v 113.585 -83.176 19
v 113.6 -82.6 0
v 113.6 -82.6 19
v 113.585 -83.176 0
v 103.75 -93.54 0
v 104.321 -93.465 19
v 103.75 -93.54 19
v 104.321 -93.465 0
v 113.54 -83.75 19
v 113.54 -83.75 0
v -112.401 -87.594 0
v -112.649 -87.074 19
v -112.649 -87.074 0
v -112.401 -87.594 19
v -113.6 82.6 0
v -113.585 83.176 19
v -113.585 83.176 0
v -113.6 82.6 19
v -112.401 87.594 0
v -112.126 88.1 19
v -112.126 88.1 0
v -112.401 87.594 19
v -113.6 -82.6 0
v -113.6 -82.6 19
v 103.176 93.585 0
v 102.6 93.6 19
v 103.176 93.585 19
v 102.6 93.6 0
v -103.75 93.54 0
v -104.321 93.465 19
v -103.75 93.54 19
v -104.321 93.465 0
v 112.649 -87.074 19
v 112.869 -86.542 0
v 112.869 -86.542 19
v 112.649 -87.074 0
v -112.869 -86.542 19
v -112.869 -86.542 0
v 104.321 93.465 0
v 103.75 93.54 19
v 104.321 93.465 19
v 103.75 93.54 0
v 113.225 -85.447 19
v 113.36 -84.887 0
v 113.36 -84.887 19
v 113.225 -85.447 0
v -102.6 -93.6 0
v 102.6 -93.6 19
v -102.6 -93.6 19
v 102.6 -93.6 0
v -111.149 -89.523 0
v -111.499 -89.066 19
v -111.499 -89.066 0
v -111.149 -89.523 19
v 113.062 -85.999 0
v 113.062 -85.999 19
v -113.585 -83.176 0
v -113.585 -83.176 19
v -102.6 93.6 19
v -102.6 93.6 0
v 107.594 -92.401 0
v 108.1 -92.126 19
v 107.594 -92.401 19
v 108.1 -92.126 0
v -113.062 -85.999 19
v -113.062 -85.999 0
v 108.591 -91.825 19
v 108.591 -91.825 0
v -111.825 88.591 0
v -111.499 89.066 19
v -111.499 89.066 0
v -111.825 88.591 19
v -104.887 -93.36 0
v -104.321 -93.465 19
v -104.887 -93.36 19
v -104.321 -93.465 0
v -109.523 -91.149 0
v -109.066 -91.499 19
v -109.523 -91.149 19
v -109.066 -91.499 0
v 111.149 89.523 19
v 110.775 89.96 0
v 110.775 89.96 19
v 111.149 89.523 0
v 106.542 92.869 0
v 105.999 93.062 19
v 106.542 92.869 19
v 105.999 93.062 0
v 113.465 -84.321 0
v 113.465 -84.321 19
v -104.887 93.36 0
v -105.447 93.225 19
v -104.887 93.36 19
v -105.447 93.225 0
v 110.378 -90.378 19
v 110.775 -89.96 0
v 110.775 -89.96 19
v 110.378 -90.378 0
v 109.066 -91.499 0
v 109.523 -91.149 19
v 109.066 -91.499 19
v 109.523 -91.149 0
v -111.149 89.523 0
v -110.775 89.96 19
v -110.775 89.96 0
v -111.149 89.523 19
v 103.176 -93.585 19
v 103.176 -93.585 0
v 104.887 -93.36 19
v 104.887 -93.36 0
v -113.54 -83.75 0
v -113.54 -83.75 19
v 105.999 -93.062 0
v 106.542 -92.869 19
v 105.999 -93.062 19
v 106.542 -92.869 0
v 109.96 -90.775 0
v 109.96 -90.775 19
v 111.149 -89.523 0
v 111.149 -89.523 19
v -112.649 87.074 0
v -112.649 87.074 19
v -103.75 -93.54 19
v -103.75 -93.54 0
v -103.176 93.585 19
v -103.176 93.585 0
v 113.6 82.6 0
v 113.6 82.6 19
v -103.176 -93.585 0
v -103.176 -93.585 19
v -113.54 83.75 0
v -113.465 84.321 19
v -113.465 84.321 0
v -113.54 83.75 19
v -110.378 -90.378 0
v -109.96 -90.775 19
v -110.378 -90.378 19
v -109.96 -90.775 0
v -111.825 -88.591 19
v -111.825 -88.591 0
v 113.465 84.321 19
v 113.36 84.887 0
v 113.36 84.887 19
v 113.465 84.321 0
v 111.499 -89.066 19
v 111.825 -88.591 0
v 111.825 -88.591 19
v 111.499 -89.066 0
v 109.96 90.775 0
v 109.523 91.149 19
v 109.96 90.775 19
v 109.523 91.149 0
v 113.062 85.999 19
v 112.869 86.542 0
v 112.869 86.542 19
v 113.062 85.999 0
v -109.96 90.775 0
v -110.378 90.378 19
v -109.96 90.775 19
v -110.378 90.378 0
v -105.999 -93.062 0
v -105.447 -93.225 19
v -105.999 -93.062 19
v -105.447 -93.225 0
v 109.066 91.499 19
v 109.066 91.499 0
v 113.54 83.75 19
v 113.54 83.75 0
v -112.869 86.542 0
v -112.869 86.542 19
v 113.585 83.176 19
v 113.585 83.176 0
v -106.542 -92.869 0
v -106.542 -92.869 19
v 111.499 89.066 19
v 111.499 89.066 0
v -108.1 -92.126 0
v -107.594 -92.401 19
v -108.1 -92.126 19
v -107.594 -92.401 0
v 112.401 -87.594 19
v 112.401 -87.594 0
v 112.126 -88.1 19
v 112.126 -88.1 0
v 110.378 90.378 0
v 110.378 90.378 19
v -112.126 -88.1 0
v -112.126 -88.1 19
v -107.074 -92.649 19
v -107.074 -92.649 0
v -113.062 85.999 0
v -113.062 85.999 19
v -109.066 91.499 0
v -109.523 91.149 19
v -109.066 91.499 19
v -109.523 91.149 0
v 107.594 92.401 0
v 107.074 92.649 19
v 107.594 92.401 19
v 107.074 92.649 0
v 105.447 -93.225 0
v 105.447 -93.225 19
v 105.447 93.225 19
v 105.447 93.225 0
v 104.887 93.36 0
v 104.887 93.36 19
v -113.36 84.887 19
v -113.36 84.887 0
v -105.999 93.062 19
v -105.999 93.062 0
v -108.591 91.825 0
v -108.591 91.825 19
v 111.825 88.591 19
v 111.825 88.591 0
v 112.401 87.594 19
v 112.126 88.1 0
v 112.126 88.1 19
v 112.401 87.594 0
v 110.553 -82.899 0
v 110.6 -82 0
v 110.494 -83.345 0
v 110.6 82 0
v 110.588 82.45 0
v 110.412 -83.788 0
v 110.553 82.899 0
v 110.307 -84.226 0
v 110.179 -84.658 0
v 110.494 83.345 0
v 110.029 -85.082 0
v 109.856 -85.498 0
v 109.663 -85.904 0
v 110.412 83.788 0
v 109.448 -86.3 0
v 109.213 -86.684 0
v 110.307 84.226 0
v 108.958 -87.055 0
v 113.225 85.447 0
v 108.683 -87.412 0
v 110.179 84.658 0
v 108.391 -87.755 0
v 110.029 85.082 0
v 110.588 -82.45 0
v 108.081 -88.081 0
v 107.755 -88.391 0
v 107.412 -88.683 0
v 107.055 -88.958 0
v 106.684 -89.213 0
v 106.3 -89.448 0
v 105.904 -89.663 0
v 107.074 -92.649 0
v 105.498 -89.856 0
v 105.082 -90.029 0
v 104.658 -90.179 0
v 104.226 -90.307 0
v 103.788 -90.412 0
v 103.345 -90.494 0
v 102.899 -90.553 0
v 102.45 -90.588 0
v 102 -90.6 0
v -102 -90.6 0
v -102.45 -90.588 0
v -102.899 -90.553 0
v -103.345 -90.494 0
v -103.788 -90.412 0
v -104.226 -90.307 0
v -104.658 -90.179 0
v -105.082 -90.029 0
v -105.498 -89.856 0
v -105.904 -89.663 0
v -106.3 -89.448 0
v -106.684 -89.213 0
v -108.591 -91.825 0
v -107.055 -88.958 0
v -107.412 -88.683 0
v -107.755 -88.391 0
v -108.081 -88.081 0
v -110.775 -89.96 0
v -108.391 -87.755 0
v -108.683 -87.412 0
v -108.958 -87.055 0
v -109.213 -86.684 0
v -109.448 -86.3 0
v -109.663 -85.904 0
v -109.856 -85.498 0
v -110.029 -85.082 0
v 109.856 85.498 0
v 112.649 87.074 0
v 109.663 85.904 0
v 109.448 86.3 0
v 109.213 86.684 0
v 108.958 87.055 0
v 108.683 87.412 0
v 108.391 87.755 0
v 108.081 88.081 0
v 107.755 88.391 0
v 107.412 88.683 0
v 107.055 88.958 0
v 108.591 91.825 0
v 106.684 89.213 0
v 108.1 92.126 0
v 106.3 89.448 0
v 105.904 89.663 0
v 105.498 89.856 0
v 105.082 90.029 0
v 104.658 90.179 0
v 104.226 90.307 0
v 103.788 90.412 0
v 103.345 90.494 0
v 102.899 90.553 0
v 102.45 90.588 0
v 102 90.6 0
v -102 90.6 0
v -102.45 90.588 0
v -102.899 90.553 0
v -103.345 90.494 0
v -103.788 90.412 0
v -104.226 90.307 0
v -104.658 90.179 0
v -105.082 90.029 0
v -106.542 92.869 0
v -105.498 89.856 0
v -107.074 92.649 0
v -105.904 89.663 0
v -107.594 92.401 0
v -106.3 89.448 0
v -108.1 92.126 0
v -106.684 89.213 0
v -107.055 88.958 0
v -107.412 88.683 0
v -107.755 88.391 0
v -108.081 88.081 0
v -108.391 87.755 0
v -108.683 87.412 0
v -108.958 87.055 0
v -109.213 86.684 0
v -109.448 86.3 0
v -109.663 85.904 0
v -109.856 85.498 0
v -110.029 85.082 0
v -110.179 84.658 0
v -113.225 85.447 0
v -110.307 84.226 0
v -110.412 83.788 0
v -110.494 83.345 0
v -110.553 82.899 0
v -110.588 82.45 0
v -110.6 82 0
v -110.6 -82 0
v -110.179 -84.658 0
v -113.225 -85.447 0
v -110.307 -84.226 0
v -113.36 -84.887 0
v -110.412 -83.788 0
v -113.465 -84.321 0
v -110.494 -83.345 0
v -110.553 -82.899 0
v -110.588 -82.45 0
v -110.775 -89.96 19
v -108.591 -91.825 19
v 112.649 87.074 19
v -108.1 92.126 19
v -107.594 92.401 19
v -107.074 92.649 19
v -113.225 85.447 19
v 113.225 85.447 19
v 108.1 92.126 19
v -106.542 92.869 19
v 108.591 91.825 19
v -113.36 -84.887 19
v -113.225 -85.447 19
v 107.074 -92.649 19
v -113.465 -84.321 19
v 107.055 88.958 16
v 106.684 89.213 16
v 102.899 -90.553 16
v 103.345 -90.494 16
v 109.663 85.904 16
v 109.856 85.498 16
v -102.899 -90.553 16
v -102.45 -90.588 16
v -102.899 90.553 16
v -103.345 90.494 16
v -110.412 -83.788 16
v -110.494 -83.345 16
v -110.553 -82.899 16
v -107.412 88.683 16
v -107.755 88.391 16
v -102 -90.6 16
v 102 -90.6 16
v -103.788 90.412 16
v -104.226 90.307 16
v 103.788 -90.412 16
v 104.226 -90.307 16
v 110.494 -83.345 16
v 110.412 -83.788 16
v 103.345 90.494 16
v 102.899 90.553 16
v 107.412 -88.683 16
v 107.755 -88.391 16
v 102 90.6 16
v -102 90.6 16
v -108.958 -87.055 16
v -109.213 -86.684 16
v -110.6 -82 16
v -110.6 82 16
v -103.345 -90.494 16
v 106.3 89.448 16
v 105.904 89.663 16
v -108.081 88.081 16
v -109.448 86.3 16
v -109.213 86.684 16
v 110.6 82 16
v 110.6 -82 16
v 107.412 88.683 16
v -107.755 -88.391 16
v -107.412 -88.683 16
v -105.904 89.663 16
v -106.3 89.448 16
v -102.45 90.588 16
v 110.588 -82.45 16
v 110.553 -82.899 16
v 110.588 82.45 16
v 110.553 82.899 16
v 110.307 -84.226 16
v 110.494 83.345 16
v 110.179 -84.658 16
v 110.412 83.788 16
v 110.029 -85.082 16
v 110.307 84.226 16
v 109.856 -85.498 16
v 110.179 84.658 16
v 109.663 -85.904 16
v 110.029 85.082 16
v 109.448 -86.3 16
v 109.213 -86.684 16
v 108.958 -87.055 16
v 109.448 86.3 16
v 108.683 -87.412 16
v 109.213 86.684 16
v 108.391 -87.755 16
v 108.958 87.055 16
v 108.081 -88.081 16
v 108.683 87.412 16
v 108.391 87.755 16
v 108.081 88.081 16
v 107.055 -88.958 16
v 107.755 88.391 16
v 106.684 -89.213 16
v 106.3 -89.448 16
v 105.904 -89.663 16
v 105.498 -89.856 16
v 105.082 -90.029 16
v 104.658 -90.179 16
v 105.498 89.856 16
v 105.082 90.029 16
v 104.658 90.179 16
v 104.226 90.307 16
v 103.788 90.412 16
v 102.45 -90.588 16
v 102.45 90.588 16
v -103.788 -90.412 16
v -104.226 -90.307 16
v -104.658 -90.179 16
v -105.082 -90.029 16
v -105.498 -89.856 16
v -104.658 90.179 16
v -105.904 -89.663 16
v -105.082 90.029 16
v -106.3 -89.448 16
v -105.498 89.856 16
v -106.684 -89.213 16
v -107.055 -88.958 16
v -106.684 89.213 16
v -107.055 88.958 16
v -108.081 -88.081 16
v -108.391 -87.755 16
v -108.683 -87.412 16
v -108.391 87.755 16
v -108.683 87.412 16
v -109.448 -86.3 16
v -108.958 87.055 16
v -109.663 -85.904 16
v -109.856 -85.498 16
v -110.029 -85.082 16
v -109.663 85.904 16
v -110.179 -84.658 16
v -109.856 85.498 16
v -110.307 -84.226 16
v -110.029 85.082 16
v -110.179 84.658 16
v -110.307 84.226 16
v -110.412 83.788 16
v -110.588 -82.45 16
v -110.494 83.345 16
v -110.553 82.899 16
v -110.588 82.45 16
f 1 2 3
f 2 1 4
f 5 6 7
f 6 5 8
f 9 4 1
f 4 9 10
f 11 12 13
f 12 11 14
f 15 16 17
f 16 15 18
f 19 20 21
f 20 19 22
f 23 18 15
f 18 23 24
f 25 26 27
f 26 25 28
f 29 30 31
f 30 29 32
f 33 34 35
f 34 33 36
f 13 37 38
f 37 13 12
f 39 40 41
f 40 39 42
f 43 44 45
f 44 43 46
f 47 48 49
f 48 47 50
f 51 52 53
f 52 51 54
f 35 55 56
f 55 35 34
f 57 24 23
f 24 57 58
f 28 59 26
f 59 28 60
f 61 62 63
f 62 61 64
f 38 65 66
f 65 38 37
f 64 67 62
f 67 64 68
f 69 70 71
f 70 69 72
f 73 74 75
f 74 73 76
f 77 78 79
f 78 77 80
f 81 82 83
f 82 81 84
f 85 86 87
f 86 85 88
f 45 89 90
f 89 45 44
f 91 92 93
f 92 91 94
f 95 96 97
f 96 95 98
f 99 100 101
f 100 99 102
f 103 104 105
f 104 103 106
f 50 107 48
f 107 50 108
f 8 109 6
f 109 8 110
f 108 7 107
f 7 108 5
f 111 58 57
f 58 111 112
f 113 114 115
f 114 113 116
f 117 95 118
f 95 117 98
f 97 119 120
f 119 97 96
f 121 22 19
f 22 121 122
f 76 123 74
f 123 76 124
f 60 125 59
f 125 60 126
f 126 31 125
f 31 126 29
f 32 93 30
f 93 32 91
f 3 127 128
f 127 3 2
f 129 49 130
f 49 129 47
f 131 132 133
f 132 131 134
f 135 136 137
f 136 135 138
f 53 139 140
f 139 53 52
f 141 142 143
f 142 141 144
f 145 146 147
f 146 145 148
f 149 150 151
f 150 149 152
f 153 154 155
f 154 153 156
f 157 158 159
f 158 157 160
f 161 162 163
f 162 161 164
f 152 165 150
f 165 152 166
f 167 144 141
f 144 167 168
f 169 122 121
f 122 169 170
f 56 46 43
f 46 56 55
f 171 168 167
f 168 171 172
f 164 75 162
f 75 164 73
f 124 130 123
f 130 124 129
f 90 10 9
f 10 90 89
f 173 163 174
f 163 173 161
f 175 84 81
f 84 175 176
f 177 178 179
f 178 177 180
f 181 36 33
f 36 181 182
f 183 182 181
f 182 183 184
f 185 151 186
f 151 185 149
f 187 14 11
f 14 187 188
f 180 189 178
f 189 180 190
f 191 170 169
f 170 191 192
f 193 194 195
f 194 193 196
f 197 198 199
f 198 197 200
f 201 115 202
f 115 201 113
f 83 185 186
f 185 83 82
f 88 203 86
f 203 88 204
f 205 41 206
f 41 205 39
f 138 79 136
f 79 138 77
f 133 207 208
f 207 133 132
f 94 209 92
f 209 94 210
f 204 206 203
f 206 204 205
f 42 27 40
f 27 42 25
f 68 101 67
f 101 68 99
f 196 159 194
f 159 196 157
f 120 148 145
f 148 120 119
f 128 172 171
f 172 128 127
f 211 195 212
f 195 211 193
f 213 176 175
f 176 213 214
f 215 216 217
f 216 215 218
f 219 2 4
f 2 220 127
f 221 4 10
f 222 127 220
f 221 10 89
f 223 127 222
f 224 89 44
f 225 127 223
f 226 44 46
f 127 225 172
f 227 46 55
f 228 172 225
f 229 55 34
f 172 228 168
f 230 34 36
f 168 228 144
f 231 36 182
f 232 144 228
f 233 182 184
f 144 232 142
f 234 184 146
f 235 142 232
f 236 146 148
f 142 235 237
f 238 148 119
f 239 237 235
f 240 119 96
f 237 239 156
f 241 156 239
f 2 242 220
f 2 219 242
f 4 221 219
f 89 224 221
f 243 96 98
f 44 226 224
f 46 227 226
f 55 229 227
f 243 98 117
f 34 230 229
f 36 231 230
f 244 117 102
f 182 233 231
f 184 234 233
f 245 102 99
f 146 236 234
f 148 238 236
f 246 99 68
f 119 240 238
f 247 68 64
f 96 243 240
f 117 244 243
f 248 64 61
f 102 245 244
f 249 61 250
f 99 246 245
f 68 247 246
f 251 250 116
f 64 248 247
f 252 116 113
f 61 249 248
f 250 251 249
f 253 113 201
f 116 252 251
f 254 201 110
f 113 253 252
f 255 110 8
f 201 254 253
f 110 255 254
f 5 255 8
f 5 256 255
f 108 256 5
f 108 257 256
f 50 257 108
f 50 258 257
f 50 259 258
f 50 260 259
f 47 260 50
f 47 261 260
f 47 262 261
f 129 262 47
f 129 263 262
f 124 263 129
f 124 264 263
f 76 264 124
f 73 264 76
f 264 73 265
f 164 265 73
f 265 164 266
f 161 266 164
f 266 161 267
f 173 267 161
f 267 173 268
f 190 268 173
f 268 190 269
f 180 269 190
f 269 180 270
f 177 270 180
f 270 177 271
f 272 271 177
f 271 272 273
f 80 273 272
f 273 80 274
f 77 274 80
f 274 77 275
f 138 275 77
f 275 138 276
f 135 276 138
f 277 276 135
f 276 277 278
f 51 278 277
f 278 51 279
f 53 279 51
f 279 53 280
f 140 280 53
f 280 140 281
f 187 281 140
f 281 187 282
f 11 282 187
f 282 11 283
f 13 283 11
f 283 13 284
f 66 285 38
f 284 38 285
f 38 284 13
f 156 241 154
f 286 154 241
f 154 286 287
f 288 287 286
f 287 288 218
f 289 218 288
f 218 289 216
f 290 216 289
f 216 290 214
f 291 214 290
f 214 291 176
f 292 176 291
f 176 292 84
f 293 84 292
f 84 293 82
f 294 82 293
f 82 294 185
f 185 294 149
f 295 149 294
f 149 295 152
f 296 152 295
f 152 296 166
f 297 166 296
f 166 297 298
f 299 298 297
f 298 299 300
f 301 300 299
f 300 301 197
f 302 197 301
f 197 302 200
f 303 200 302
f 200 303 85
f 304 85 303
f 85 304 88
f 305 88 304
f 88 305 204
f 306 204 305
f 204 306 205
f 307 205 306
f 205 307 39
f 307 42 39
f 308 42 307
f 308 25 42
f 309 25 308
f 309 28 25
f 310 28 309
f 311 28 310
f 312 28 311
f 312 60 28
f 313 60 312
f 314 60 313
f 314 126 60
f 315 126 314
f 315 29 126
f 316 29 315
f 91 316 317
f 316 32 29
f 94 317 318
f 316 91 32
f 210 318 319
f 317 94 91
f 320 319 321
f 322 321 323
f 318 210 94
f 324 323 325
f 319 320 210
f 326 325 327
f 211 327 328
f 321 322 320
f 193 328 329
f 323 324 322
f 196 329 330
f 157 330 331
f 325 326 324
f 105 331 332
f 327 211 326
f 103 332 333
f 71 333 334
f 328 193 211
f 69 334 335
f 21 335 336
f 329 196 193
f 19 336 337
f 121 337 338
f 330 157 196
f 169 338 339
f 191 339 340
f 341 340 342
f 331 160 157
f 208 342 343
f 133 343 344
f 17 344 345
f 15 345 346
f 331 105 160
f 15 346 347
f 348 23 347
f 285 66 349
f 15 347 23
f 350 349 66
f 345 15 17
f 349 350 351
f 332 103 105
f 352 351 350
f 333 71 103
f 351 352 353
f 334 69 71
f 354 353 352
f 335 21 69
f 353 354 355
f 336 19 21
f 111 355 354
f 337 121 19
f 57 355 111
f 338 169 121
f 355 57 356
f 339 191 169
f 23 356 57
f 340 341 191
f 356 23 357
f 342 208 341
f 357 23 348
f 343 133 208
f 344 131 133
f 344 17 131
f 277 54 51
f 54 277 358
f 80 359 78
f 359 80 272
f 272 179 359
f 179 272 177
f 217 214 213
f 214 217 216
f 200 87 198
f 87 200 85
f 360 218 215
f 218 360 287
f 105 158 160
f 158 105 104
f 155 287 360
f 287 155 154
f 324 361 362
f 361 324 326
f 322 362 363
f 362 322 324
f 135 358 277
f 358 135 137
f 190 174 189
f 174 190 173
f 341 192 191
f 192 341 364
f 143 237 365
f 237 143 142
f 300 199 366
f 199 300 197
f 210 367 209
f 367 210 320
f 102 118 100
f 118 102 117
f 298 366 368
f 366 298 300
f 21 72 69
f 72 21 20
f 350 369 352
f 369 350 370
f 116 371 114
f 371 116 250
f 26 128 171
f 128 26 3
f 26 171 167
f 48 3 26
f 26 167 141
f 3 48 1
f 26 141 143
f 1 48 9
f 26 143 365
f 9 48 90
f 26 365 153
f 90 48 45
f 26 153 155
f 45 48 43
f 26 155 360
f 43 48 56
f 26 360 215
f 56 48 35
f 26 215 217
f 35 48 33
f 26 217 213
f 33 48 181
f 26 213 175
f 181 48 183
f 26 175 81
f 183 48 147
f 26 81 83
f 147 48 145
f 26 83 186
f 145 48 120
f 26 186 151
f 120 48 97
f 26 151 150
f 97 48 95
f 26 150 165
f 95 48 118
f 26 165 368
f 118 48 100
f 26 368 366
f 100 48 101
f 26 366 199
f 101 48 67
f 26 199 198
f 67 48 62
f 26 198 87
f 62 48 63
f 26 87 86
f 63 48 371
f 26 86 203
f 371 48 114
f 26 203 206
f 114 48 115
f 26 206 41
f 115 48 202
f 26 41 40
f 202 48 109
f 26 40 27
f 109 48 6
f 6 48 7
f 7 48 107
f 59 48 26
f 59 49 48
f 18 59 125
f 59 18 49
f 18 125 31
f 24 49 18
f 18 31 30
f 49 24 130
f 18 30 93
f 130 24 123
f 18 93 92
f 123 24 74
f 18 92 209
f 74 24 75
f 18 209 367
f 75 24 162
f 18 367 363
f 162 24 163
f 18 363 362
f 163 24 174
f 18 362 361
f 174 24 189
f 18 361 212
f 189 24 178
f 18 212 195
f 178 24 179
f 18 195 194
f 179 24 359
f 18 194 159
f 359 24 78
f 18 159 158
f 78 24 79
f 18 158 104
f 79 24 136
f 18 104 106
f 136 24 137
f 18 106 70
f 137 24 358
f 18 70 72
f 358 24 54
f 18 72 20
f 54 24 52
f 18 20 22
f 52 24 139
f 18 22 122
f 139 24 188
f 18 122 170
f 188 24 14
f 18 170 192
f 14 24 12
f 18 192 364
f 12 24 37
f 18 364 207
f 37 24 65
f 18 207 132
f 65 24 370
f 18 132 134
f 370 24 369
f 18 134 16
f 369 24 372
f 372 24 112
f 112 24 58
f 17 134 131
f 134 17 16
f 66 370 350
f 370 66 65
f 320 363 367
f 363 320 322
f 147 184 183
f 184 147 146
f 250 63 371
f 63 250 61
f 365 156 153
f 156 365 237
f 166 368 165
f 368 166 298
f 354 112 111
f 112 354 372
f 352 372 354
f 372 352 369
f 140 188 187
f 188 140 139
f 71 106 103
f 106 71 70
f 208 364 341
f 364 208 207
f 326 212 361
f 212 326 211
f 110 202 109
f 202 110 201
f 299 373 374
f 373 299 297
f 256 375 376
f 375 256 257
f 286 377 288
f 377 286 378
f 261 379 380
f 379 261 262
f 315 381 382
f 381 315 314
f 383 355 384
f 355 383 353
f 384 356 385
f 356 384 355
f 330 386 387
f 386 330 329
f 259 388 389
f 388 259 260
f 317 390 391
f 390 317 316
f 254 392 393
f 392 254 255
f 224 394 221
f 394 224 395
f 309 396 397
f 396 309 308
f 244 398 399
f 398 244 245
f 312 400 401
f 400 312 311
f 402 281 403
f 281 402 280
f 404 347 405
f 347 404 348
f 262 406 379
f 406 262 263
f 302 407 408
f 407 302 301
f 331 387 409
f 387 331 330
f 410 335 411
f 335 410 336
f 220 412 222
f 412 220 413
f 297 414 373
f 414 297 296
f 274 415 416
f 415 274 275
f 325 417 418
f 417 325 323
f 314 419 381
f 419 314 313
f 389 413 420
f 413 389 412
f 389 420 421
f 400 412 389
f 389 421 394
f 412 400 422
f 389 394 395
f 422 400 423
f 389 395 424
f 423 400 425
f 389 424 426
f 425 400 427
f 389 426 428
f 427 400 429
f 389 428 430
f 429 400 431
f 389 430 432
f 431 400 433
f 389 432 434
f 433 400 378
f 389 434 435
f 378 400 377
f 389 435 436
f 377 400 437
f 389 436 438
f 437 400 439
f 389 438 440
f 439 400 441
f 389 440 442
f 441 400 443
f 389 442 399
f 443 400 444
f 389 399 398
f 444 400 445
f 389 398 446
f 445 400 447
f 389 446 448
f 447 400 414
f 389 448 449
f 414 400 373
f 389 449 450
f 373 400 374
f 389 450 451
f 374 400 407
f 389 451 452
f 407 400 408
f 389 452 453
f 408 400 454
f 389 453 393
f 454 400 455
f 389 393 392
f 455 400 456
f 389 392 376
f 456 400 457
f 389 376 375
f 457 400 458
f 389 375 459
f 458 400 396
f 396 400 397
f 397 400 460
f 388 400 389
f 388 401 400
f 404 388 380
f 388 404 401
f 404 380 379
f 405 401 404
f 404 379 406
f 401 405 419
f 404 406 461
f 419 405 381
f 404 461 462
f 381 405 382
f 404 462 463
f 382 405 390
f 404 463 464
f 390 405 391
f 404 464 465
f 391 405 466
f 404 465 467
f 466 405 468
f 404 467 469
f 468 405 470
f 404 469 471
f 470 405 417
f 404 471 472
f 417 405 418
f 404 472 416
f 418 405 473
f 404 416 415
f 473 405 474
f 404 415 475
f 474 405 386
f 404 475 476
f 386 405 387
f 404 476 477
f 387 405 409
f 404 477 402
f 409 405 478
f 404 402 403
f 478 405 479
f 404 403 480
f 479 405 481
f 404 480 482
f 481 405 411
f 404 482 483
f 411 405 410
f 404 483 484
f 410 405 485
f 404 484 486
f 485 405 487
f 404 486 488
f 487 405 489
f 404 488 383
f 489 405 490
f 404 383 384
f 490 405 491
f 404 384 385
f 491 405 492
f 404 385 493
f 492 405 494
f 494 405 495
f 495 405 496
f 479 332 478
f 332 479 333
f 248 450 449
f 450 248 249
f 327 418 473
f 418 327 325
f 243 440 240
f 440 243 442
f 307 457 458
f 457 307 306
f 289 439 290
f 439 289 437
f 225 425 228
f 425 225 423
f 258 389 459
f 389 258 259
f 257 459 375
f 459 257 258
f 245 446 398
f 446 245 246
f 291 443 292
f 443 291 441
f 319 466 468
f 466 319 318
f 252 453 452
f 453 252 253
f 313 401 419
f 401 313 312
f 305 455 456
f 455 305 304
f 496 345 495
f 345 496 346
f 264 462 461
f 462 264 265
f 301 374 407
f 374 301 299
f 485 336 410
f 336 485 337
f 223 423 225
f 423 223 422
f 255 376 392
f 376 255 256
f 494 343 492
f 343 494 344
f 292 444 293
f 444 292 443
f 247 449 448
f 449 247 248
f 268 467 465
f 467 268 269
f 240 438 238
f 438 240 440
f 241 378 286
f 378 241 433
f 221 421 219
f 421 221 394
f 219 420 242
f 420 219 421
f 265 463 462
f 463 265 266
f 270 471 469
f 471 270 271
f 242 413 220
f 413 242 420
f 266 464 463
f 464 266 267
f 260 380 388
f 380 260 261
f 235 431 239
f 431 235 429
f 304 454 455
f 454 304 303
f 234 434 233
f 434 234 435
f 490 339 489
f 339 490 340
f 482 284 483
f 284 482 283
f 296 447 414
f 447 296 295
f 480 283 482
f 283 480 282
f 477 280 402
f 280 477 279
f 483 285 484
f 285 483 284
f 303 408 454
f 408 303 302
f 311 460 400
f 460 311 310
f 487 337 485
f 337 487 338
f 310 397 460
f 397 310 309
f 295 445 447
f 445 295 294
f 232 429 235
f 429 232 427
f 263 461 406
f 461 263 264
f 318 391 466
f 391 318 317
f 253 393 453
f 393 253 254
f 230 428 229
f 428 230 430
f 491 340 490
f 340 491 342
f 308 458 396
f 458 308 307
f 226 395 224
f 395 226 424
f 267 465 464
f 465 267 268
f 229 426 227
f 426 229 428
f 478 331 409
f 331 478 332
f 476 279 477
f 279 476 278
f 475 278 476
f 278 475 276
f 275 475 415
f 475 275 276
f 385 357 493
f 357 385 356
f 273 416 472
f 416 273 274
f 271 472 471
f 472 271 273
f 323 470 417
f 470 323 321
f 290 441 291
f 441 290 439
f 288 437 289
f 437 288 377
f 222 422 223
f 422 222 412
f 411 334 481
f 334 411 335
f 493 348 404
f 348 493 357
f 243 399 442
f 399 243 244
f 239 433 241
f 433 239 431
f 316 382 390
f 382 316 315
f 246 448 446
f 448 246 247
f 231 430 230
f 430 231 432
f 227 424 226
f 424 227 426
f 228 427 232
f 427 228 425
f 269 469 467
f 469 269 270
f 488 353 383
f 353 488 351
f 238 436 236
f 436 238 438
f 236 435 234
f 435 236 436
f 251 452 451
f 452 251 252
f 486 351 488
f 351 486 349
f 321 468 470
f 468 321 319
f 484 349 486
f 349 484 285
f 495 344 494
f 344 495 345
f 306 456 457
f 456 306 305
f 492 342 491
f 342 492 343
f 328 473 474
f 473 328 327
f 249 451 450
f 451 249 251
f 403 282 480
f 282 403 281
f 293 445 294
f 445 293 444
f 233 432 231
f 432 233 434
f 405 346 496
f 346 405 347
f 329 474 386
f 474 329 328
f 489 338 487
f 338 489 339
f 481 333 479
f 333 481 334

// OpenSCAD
// file: hopper_util.scad
// Shared geometry helpers.
// GPL-3.0-or-later and CERN-OHL-S-2.0; see LICENSING.md
// Units: mm

// These names are deliberately unprefixed because this project carries no
// library that defines them. A local module silently shadows a library one of
// the same name with no warning at all, so check for collisions before adding
// BOSL2, NopSCADlib or anything else global to this repo.

// This file never sets $fn: it is the consumer's to choose, and it crosses a
// `use <>` boundary as a special variable.

/**
 * Largest corner radius a rounded_square of this size can actually take.
 * offset() silently produces degenerate geometry once the radius exceeds half
 * the short side, so the request is clamped rather than left to misbehave.
 */
function fitted_radius(x, y, radius) = min(radius, min(x, y) / 2 - 0.01);

// Rectangle of x by y centred on the origin, corners rounded to `radius`.
module rounded_square(x, y, radius = 0) {
  assert(x > 0 && y > 0, str("rounded_square: x and y must be > 0, got: ", [x, y]));
  assert(radius >= 0, str("rounded_square: radius must be >= 0, got: ", radius));

  _radius = fitted_radius(x, y, radius);

  if (_radius <= 0) {
    square([x, y], center=true);
  } else {
    // offset out then in leaves the outer corners rounded and the size intact.
    offset(r=_radius) offset(delta=-_radius) square([x, y], center=true);
  }
}

// Extrusion of rounded_square, sitting on z = 0.
module rounded_box(x, y, z, radius = 0) {
  assert(z > 0, str("rounded_box: z must be > 0, got: ", z));

  linear_extrude(height=z) rounded_square(x, y, radius);
}

/**
 * Loft between two 2D sections, the first at z0 and the second at z1.
 *
 * Each section is extruded into a thin slab centred on its z and the two are
 * hulled. The slab has thickness so that adjoining lofts overlap and weld into
 * one solid instead of meeting on a coincident face, which CGAL will not always
 * resolve. Because the hull is taken between the slab EDGES, the resulting
 * taper runs from the bottom of the lower slab to the bottom of the upper one,
 * so z1 - z0 is the true rise of the sloped face.
 *
 * The two slabs are sized independently because a section that is already
 * buried inside an adjoining solid can be given extra thickness to guarantee
 * the weld without disturbing the exposed profile.
 */
module loft(z0, z1, slab0 = 1, slab1 = 1) {
  assert(z1 > z0, str("loft: z1 must be > z0, got: ", [z0, z1]));
  assert(slab0 > 0 && slab1 > 0, str("loft: slabs must be > 0, got: ", [slab0, slab1]));

  hull() {
    translate([0, 0, z0 - slab0 / 2]) linear_extrude(height=slab0) children(0);
    translate([0, 0, z1 - slab1 / 2]) linear_extrude(height=slab1) children(1);
  }
}

// Standalone preview. $fn is passed on the call, never assigned at top level --
// see dev/design-log.md. `use <>` does not run this; `include <>` would.
rounded_box(40, 25, 6, 4, $fn=$preview ? 48 : 120);
translate([60, 0, 0]) loft(0, 30, $fn=$preview ? 48 : 120) {
    circle(d=12);
    rounded_square(40, 25, 6);
  }
// main file
// Lid that slips over the top of the hopper body.
// GPL-3.0-or-later and CERN-OHL-S-2.0; see LICENSING.md
// Units: mm

use <hopper_util.scad>

/**
 * A plain slip-on lid, sitting on z = 0 at its own rim.
 *
 * It has no seal and no latch, so it keeps debris out but does nothing to keep
 * pellets dry. Tracked in issue #8.
 */
module hopper_cap(
  top_x,
  top_y,
  funnel_radius = 8,
  clearance = 0.6,
  wall = 3,
  skirt_height = 16,
  top_thickness = 3
) {
  assert(clearance > 0, str("hopper_cap: clearance must be > 0, got: ", clearance));
  assert(wall > 0, str("hopper_cap: wall must be > 0, got: ", wall));
  assert(skirt_height > 0, str("hopper_cap: skirt_height must be > 0, got: ", skirt_height));

  _inner_x = top_x + 2 * clearance;
  _inner_y = top_y + 2 * clearance;

  difference() {
    rounded_box(
      _inner_x + 2 * wall,
      _inner_y + 2 * wall,
      skirt_height + top_thickness,
      funnel_radius + wall
    );

    translate([0, 0, -1])
      rounded_box(_inner_x, _inner_y, skirt_height + 1, funnel_radius + clearance);
  }
}

// Standalone preview. $fn is passed on the call, never assigned at top level --
// see dev/design-log.md for why that is not optional.
hopper_cap(top_x=220, top_y=180, $fn=$preview ? 48 : 120);
